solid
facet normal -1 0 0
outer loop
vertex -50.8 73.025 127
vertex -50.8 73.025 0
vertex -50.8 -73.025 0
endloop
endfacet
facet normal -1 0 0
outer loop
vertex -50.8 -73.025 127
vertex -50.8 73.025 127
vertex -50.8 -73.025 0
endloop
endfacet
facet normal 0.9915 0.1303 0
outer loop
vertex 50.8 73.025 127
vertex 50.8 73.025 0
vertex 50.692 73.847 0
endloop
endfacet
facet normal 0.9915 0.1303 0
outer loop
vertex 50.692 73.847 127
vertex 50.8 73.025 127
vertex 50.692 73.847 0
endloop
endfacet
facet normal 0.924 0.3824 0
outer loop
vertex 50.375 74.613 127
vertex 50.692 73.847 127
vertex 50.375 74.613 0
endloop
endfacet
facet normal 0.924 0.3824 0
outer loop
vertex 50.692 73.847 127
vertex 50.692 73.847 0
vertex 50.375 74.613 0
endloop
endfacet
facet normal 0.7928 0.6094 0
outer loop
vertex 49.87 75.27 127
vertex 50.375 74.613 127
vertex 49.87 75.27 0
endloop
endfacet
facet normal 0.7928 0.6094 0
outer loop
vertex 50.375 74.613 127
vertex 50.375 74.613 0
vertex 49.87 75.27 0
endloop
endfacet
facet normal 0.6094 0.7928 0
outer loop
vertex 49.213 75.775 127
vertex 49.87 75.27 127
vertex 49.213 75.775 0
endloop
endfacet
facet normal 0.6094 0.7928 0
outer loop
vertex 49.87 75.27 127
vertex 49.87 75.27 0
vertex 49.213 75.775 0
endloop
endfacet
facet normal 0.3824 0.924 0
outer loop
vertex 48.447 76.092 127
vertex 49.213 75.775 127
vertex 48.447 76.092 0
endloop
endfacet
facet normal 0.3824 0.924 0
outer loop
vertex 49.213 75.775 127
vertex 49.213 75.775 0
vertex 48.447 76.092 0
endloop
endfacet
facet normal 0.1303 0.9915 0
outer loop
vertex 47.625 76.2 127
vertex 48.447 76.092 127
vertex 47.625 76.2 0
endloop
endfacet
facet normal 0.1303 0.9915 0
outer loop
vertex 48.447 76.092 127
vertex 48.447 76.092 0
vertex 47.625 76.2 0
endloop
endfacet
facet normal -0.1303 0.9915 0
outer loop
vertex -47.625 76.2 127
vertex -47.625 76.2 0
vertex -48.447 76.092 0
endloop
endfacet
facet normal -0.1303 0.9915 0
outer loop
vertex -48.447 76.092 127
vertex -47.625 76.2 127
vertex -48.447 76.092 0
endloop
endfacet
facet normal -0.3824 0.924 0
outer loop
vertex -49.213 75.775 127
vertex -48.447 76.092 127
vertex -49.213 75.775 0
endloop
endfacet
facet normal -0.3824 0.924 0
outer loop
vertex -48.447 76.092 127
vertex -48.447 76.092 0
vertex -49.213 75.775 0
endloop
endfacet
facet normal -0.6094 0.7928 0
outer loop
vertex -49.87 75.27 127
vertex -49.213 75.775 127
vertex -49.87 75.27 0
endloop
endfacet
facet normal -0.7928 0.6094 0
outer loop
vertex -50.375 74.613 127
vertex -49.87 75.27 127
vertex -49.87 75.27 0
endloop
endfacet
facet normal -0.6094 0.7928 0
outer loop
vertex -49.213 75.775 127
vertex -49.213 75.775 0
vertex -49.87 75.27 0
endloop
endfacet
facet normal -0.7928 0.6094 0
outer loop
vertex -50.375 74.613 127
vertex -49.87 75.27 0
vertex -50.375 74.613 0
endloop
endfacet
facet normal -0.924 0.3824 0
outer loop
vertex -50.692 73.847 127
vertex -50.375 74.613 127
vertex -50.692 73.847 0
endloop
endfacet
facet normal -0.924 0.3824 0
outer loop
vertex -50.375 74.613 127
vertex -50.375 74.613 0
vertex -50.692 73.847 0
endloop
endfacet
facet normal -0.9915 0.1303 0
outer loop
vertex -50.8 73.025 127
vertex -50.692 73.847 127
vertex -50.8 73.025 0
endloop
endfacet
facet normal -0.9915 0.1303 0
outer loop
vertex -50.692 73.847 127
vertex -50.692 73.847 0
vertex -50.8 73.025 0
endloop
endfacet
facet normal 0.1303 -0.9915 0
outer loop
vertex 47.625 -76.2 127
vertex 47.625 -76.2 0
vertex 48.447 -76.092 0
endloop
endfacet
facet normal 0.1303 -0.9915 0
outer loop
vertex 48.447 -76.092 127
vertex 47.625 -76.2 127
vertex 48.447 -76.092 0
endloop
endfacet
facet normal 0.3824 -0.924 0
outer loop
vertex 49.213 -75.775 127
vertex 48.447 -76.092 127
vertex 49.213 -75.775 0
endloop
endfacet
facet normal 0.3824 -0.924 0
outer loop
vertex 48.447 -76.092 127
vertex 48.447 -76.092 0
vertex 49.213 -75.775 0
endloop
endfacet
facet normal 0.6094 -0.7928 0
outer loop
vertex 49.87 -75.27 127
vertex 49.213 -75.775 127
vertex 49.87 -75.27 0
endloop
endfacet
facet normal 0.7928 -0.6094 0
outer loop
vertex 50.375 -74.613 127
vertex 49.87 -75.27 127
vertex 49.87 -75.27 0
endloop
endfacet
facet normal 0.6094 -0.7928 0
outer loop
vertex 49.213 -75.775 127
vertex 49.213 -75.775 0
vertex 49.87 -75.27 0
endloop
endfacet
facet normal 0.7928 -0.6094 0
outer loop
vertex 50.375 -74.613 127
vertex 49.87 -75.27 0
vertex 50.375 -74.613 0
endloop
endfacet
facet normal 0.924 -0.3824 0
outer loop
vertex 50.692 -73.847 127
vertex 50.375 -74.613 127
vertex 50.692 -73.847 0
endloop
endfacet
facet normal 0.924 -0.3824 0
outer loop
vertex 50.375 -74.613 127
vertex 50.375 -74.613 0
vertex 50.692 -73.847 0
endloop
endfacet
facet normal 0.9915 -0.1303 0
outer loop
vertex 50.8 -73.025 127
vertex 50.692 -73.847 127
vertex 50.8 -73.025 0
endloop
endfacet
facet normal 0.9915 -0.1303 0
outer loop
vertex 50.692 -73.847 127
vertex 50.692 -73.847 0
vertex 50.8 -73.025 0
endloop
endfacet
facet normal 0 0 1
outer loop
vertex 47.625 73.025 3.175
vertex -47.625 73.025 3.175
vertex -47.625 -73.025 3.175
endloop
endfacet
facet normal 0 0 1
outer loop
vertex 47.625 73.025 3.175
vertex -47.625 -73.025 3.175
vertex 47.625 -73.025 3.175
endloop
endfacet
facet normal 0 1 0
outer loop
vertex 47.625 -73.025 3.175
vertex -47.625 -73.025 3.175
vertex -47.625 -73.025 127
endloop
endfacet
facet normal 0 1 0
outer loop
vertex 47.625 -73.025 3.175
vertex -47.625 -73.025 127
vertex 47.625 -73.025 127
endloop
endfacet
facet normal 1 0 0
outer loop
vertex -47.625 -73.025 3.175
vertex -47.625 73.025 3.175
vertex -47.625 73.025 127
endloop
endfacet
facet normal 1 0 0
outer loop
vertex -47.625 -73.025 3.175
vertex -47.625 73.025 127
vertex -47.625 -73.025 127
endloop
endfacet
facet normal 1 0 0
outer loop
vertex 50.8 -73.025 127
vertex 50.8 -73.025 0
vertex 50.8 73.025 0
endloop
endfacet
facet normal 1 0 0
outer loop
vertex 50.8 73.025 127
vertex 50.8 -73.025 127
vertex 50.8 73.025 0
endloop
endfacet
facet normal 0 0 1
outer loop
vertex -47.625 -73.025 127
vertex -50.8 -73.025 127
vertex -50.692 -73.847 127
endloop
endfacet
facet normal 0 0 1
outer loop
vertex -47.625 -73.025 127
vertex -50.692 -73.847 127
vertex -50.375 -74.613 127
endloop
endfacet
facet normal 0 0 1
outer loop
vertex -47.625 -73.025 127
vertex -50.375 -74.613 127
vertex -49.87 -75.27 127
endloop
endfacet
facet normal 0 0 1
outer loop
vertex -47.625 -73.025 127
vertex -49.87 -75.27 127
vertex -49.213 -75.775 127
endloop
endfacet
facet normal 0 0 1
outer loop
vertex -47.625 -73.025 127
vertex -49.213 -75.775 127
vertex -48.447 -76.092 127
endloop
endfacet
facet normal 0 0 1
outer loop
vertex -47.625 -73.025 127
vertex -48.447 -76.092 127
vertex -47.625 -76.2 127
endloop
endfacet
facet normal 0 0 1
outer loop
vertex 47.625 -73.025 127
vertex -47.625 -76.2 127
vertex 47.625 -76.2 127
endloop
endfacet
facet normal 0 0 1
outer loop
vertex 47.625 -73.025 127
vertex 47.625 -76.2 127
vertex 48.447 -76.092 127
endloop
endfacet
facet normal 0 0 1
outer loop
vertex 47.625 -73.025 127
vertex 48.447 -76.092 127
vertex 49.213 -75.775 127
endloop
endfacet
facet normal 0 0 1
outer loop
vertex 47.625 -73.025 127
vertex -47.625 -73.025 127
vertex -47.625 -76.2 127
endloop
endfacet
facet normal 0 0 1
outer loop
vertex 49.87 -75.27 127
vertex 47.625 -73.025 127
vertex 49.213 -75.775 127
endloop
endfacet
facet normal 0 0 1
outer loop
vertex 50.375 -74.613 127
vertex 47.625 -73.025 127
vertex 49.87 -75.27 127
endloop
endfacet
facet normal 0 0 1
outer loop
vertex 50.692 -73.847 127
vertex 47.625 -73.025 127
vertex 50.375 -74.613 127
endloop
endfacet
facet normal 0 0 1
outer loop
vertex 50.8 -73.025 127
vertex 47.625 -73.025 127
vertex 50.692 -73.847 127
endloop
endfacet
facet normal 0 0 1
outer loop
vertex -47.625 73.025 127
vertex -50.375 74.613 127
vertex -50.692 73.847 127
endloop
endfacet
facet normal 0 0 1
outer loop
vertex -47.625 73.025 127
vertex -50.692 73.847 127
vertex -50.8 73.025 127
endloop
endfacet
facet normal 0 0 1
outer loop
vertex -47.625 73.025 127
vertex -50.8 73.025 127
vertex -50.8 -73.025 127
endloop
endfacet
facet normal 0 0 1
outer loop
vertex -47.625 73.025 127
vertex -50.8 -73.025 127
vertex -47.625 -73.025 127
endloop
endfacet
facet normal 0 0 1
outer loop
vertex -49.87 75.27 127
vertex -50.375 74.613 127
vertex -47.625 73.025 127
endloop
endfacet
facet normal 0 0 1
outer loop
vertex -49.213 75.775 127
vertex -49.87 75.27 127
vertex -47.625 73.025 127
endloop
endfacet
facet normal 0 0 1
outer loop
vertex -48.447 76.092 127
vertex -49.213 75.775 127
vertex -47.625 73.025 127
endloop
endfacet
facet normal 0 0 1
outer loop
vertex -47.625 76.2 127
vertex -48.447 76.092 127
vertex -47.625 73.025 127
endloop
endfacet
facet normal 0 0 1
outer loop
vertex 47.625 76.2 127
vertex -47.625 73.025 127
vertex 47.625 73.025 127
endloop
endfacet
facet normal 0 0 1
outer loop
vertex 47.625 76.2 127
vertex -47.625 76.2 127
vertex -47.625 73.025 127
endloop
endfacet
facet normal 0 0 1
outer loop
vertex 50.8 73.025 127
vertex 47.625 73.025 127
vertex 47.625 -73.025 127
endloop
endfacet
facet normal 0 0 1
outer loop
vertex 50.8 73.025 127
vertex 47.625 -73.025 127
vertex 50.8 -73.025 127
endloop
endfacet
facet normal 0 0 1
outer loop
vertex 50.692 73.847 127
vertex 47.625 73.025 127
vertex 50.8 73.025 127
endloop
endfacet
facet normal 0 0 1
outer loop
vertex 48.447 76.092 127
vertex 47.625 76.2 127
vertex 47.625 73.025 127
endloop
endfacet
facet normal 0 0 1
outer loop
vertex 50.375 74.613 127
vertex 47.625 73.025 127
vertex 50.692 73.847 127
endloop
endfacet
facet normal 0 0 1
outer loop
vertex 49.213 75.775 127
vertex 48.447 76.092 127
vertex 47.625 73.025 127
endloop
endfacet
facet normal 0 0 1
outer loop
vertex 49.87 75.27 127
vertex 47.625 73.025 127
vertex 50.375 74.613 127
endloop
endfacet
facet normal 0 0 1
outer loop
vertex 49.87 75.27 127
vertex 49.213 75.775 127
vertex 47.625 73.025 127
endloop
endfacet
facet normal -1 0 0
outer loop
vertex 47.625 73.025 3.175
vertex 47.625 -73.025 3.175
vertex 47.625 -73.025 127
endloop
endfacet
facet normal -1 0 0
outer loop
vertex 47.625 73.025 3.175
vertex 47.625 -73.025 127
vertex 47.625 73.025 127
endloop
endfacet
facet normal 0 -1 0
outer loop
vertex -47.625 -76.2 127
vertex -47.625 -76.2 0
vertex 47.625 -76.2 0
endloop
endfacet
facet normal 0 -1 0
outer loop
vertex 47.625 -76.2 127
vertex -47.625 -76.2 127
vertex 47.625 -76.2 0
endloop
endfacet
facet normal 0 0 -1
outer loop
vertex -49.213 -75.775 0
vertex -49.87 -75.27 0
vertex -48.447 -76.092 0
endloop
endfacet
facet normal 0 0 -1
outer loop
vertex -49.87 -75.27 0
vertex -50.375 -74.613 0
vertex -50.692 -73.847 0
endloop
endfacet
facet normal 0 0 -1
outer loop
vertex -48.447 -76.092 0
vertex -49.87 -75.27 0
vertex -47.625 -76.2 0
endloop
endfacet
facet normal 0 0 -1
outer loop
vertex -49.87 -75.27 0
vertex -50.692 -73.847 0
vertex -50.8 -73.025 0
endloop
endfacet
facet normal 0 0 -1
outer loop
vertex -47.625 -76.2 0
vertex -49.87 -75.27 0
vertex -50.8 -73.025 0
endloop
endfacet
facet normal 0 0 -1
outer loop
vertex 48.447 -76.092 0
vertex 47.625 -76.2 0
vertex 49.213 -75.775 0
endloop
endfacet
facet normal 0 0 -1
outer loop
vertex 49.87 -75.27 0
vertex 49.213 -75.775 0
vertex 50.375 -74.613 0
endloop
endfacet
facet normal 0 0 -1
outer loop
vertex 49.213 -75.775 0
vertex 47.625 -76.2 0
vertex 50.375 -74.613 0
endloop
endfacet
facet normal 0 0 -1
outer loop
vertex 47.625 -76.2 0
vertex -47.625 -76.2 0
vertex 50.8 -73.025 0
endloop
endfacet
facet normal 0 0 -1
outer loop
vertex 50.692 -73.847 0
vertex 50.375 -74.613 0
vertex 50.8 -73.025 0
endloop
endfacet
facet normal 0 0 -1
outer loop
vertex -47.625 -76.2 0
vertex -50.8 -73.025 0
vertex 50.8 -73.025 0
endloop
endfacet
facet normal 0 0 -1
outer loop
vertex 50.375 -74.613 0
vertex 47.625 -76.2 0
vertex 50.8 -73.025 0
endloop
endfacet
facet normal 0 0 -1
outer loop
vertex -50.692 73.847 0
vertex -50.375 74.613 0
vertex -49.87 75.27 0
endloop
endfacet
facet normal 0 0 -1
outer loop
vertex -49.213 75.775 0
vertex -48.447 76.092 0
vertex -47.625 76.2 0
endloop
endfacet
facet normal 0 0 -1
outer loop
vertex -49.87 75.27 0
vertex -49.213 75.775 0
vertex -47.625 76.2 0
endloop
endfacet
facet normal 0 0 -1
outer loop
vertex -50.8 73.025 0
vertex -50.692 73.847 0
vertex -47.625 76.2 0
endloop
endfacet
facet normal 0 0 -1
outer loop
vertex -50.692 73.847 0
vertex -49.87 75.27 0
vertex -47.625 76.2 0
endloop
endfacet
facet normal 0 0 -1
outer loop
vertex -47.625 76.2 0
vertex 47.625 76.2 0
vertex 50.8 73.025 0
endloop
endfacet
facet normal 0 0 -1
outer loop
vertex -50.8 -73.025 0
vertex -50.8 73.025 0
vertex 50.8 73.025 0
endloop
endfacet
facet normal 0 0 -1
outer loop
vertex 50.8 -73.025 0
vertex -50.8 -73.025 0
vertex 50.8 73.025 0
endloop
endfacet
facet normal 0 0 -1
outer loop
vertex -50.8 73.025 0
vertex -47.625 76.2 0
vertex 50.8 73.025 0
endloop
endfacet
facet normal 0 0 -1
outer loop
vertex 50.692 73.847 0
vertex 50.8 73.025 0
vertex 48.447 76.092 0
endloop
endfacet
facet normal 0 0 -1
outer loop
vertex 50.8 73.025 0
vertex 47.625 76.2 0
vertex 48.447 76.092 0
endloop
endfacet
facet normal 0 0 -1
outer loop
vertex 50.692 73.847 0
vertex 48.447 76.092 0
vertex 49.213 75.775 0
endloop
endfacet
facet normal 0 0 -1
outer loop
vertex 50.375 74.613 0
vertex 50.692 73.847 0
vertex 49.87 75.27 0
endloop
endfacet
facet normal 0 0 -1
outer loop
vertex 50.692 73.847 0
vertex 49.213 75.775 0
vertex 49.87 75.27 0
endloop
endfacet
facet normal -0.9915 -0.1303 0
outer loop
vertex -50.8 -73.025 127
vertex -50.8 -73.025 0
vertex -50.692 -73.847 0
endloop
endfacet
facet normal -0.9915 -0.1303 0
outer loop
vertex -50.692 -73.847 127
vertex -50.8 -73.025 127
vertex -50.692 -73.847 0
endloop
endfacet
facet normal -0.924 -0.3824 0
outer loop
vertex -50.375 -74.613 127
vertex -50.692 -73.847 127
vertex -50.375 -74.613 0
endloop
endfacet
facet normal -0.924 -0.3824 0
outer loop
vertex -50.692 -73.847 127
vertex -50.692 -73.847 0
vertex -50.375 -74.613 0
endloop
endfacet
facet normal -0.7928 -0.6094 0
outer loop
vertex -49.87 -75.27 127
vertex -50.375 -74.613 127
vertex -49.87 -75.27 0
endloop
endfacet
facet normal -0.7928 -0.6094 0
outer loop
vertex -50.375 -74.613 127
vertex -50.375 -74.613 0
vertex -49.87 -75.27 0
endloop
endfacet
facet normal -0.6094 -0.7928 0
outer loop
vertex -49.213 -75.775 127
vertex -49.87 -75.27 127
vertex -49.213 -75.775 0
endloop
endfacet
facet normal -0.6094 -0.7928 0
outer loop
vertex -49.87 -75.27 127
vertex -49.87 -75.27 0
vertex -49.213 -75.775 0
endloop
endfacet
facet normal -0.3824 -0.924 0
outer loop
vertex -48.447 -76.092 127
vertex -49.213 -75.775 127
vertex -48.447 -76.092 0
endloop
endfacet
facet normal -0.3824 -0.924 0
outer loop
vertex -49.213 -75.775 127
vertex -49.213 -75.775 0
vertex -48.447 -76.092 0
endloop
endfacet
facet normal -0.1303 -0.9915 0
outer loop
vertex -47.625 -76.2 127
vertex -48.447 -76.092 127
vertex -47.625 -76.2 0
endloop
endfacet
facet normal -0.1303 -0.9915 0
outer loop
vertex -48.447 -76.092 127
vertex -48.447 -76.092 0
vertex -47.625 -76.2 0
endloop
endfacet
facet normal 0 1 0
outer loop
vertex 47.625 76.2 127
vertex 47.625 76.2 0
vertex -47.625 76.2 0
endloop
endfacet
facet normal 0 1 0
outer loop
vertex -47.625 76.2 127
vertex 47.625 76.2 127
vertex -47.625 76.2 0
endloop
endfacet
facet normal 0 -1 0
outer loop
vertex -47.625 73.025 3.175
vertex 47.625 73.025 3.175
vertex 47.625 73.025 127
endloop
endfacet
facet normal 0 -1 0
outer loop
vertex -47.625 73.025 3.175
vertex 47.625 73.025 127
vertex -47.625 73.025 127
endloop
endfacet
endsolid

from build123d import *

# Parameters (mm, degrees)
F1_DEPTH = 127
F2_T     = 3.175


# Not quite as in the source:
# - a shell that OpenCascade refuses in one call is made with other operations: the cavity is built on its own and cut out


with BuildPart() as f1:
    # F0 (on Top) → F1 (new body)
    with BuildSketch(Plane.XY):
        with BuildLine():
            ThreePointArc((50.8, 73.025), (49.8700640303, 75.2700640303), (47.625, 76.2))
            Line((47.625, 76.2), (-47.625, 76.2))
            ThreePointArc((-47.625, 76.2), (-49.8700640303, 75.2700640303), (-50.8, 73.025))
            Line((-50.8, 73.025), (-50.8, -73.025))
            ThreePointArc((-50.8, -73.025), (-49.8700640303, -75.2700640303), (-47.625, -76.2))
            Line((-47.625, -76.2), (47.625, -76.2))
            ThreePointArc((47.625, -76.2), (49.8700640303, -75.2700640303), (50.8, -73.025))
            Line((50.8, -73.025), (50.8, 73.025))
        make_face()
    extrude(amount=F1_DEPTH)

    # F2: shell of thickness 3.175, made by hand


with BuildPart() as f2_core1:
    # F2_t2: copy of F1
    add(f1.part)

    # the walls: a layer under each face that stays
    f2_faces = [f2_core1.faces().sort_by_distance(p)[0] for p in [
        (0, 76.2, 63.5),
        (-50.8, 0, 63.5),
        (0, -76.2, 63.5),
        (50.8, 0, 63.5),
        (0, 0, 0),
    ]]
    thicken(f2_faces, amount=-F2_T, mode=Mode.SUBTRACT)


with BuildPart() as f1_1:
    add(f1.part)

    # what is left inside the walls is the cavity
    f2_cavity = [f2_core1.part.solids().sort_by_distance(p)[0] for p in [
        (47.59325, 0, 85.725),
    ]]
    add(f2_cavity, mode=Mode.SUBTRACT)


solid = f1_1.part
